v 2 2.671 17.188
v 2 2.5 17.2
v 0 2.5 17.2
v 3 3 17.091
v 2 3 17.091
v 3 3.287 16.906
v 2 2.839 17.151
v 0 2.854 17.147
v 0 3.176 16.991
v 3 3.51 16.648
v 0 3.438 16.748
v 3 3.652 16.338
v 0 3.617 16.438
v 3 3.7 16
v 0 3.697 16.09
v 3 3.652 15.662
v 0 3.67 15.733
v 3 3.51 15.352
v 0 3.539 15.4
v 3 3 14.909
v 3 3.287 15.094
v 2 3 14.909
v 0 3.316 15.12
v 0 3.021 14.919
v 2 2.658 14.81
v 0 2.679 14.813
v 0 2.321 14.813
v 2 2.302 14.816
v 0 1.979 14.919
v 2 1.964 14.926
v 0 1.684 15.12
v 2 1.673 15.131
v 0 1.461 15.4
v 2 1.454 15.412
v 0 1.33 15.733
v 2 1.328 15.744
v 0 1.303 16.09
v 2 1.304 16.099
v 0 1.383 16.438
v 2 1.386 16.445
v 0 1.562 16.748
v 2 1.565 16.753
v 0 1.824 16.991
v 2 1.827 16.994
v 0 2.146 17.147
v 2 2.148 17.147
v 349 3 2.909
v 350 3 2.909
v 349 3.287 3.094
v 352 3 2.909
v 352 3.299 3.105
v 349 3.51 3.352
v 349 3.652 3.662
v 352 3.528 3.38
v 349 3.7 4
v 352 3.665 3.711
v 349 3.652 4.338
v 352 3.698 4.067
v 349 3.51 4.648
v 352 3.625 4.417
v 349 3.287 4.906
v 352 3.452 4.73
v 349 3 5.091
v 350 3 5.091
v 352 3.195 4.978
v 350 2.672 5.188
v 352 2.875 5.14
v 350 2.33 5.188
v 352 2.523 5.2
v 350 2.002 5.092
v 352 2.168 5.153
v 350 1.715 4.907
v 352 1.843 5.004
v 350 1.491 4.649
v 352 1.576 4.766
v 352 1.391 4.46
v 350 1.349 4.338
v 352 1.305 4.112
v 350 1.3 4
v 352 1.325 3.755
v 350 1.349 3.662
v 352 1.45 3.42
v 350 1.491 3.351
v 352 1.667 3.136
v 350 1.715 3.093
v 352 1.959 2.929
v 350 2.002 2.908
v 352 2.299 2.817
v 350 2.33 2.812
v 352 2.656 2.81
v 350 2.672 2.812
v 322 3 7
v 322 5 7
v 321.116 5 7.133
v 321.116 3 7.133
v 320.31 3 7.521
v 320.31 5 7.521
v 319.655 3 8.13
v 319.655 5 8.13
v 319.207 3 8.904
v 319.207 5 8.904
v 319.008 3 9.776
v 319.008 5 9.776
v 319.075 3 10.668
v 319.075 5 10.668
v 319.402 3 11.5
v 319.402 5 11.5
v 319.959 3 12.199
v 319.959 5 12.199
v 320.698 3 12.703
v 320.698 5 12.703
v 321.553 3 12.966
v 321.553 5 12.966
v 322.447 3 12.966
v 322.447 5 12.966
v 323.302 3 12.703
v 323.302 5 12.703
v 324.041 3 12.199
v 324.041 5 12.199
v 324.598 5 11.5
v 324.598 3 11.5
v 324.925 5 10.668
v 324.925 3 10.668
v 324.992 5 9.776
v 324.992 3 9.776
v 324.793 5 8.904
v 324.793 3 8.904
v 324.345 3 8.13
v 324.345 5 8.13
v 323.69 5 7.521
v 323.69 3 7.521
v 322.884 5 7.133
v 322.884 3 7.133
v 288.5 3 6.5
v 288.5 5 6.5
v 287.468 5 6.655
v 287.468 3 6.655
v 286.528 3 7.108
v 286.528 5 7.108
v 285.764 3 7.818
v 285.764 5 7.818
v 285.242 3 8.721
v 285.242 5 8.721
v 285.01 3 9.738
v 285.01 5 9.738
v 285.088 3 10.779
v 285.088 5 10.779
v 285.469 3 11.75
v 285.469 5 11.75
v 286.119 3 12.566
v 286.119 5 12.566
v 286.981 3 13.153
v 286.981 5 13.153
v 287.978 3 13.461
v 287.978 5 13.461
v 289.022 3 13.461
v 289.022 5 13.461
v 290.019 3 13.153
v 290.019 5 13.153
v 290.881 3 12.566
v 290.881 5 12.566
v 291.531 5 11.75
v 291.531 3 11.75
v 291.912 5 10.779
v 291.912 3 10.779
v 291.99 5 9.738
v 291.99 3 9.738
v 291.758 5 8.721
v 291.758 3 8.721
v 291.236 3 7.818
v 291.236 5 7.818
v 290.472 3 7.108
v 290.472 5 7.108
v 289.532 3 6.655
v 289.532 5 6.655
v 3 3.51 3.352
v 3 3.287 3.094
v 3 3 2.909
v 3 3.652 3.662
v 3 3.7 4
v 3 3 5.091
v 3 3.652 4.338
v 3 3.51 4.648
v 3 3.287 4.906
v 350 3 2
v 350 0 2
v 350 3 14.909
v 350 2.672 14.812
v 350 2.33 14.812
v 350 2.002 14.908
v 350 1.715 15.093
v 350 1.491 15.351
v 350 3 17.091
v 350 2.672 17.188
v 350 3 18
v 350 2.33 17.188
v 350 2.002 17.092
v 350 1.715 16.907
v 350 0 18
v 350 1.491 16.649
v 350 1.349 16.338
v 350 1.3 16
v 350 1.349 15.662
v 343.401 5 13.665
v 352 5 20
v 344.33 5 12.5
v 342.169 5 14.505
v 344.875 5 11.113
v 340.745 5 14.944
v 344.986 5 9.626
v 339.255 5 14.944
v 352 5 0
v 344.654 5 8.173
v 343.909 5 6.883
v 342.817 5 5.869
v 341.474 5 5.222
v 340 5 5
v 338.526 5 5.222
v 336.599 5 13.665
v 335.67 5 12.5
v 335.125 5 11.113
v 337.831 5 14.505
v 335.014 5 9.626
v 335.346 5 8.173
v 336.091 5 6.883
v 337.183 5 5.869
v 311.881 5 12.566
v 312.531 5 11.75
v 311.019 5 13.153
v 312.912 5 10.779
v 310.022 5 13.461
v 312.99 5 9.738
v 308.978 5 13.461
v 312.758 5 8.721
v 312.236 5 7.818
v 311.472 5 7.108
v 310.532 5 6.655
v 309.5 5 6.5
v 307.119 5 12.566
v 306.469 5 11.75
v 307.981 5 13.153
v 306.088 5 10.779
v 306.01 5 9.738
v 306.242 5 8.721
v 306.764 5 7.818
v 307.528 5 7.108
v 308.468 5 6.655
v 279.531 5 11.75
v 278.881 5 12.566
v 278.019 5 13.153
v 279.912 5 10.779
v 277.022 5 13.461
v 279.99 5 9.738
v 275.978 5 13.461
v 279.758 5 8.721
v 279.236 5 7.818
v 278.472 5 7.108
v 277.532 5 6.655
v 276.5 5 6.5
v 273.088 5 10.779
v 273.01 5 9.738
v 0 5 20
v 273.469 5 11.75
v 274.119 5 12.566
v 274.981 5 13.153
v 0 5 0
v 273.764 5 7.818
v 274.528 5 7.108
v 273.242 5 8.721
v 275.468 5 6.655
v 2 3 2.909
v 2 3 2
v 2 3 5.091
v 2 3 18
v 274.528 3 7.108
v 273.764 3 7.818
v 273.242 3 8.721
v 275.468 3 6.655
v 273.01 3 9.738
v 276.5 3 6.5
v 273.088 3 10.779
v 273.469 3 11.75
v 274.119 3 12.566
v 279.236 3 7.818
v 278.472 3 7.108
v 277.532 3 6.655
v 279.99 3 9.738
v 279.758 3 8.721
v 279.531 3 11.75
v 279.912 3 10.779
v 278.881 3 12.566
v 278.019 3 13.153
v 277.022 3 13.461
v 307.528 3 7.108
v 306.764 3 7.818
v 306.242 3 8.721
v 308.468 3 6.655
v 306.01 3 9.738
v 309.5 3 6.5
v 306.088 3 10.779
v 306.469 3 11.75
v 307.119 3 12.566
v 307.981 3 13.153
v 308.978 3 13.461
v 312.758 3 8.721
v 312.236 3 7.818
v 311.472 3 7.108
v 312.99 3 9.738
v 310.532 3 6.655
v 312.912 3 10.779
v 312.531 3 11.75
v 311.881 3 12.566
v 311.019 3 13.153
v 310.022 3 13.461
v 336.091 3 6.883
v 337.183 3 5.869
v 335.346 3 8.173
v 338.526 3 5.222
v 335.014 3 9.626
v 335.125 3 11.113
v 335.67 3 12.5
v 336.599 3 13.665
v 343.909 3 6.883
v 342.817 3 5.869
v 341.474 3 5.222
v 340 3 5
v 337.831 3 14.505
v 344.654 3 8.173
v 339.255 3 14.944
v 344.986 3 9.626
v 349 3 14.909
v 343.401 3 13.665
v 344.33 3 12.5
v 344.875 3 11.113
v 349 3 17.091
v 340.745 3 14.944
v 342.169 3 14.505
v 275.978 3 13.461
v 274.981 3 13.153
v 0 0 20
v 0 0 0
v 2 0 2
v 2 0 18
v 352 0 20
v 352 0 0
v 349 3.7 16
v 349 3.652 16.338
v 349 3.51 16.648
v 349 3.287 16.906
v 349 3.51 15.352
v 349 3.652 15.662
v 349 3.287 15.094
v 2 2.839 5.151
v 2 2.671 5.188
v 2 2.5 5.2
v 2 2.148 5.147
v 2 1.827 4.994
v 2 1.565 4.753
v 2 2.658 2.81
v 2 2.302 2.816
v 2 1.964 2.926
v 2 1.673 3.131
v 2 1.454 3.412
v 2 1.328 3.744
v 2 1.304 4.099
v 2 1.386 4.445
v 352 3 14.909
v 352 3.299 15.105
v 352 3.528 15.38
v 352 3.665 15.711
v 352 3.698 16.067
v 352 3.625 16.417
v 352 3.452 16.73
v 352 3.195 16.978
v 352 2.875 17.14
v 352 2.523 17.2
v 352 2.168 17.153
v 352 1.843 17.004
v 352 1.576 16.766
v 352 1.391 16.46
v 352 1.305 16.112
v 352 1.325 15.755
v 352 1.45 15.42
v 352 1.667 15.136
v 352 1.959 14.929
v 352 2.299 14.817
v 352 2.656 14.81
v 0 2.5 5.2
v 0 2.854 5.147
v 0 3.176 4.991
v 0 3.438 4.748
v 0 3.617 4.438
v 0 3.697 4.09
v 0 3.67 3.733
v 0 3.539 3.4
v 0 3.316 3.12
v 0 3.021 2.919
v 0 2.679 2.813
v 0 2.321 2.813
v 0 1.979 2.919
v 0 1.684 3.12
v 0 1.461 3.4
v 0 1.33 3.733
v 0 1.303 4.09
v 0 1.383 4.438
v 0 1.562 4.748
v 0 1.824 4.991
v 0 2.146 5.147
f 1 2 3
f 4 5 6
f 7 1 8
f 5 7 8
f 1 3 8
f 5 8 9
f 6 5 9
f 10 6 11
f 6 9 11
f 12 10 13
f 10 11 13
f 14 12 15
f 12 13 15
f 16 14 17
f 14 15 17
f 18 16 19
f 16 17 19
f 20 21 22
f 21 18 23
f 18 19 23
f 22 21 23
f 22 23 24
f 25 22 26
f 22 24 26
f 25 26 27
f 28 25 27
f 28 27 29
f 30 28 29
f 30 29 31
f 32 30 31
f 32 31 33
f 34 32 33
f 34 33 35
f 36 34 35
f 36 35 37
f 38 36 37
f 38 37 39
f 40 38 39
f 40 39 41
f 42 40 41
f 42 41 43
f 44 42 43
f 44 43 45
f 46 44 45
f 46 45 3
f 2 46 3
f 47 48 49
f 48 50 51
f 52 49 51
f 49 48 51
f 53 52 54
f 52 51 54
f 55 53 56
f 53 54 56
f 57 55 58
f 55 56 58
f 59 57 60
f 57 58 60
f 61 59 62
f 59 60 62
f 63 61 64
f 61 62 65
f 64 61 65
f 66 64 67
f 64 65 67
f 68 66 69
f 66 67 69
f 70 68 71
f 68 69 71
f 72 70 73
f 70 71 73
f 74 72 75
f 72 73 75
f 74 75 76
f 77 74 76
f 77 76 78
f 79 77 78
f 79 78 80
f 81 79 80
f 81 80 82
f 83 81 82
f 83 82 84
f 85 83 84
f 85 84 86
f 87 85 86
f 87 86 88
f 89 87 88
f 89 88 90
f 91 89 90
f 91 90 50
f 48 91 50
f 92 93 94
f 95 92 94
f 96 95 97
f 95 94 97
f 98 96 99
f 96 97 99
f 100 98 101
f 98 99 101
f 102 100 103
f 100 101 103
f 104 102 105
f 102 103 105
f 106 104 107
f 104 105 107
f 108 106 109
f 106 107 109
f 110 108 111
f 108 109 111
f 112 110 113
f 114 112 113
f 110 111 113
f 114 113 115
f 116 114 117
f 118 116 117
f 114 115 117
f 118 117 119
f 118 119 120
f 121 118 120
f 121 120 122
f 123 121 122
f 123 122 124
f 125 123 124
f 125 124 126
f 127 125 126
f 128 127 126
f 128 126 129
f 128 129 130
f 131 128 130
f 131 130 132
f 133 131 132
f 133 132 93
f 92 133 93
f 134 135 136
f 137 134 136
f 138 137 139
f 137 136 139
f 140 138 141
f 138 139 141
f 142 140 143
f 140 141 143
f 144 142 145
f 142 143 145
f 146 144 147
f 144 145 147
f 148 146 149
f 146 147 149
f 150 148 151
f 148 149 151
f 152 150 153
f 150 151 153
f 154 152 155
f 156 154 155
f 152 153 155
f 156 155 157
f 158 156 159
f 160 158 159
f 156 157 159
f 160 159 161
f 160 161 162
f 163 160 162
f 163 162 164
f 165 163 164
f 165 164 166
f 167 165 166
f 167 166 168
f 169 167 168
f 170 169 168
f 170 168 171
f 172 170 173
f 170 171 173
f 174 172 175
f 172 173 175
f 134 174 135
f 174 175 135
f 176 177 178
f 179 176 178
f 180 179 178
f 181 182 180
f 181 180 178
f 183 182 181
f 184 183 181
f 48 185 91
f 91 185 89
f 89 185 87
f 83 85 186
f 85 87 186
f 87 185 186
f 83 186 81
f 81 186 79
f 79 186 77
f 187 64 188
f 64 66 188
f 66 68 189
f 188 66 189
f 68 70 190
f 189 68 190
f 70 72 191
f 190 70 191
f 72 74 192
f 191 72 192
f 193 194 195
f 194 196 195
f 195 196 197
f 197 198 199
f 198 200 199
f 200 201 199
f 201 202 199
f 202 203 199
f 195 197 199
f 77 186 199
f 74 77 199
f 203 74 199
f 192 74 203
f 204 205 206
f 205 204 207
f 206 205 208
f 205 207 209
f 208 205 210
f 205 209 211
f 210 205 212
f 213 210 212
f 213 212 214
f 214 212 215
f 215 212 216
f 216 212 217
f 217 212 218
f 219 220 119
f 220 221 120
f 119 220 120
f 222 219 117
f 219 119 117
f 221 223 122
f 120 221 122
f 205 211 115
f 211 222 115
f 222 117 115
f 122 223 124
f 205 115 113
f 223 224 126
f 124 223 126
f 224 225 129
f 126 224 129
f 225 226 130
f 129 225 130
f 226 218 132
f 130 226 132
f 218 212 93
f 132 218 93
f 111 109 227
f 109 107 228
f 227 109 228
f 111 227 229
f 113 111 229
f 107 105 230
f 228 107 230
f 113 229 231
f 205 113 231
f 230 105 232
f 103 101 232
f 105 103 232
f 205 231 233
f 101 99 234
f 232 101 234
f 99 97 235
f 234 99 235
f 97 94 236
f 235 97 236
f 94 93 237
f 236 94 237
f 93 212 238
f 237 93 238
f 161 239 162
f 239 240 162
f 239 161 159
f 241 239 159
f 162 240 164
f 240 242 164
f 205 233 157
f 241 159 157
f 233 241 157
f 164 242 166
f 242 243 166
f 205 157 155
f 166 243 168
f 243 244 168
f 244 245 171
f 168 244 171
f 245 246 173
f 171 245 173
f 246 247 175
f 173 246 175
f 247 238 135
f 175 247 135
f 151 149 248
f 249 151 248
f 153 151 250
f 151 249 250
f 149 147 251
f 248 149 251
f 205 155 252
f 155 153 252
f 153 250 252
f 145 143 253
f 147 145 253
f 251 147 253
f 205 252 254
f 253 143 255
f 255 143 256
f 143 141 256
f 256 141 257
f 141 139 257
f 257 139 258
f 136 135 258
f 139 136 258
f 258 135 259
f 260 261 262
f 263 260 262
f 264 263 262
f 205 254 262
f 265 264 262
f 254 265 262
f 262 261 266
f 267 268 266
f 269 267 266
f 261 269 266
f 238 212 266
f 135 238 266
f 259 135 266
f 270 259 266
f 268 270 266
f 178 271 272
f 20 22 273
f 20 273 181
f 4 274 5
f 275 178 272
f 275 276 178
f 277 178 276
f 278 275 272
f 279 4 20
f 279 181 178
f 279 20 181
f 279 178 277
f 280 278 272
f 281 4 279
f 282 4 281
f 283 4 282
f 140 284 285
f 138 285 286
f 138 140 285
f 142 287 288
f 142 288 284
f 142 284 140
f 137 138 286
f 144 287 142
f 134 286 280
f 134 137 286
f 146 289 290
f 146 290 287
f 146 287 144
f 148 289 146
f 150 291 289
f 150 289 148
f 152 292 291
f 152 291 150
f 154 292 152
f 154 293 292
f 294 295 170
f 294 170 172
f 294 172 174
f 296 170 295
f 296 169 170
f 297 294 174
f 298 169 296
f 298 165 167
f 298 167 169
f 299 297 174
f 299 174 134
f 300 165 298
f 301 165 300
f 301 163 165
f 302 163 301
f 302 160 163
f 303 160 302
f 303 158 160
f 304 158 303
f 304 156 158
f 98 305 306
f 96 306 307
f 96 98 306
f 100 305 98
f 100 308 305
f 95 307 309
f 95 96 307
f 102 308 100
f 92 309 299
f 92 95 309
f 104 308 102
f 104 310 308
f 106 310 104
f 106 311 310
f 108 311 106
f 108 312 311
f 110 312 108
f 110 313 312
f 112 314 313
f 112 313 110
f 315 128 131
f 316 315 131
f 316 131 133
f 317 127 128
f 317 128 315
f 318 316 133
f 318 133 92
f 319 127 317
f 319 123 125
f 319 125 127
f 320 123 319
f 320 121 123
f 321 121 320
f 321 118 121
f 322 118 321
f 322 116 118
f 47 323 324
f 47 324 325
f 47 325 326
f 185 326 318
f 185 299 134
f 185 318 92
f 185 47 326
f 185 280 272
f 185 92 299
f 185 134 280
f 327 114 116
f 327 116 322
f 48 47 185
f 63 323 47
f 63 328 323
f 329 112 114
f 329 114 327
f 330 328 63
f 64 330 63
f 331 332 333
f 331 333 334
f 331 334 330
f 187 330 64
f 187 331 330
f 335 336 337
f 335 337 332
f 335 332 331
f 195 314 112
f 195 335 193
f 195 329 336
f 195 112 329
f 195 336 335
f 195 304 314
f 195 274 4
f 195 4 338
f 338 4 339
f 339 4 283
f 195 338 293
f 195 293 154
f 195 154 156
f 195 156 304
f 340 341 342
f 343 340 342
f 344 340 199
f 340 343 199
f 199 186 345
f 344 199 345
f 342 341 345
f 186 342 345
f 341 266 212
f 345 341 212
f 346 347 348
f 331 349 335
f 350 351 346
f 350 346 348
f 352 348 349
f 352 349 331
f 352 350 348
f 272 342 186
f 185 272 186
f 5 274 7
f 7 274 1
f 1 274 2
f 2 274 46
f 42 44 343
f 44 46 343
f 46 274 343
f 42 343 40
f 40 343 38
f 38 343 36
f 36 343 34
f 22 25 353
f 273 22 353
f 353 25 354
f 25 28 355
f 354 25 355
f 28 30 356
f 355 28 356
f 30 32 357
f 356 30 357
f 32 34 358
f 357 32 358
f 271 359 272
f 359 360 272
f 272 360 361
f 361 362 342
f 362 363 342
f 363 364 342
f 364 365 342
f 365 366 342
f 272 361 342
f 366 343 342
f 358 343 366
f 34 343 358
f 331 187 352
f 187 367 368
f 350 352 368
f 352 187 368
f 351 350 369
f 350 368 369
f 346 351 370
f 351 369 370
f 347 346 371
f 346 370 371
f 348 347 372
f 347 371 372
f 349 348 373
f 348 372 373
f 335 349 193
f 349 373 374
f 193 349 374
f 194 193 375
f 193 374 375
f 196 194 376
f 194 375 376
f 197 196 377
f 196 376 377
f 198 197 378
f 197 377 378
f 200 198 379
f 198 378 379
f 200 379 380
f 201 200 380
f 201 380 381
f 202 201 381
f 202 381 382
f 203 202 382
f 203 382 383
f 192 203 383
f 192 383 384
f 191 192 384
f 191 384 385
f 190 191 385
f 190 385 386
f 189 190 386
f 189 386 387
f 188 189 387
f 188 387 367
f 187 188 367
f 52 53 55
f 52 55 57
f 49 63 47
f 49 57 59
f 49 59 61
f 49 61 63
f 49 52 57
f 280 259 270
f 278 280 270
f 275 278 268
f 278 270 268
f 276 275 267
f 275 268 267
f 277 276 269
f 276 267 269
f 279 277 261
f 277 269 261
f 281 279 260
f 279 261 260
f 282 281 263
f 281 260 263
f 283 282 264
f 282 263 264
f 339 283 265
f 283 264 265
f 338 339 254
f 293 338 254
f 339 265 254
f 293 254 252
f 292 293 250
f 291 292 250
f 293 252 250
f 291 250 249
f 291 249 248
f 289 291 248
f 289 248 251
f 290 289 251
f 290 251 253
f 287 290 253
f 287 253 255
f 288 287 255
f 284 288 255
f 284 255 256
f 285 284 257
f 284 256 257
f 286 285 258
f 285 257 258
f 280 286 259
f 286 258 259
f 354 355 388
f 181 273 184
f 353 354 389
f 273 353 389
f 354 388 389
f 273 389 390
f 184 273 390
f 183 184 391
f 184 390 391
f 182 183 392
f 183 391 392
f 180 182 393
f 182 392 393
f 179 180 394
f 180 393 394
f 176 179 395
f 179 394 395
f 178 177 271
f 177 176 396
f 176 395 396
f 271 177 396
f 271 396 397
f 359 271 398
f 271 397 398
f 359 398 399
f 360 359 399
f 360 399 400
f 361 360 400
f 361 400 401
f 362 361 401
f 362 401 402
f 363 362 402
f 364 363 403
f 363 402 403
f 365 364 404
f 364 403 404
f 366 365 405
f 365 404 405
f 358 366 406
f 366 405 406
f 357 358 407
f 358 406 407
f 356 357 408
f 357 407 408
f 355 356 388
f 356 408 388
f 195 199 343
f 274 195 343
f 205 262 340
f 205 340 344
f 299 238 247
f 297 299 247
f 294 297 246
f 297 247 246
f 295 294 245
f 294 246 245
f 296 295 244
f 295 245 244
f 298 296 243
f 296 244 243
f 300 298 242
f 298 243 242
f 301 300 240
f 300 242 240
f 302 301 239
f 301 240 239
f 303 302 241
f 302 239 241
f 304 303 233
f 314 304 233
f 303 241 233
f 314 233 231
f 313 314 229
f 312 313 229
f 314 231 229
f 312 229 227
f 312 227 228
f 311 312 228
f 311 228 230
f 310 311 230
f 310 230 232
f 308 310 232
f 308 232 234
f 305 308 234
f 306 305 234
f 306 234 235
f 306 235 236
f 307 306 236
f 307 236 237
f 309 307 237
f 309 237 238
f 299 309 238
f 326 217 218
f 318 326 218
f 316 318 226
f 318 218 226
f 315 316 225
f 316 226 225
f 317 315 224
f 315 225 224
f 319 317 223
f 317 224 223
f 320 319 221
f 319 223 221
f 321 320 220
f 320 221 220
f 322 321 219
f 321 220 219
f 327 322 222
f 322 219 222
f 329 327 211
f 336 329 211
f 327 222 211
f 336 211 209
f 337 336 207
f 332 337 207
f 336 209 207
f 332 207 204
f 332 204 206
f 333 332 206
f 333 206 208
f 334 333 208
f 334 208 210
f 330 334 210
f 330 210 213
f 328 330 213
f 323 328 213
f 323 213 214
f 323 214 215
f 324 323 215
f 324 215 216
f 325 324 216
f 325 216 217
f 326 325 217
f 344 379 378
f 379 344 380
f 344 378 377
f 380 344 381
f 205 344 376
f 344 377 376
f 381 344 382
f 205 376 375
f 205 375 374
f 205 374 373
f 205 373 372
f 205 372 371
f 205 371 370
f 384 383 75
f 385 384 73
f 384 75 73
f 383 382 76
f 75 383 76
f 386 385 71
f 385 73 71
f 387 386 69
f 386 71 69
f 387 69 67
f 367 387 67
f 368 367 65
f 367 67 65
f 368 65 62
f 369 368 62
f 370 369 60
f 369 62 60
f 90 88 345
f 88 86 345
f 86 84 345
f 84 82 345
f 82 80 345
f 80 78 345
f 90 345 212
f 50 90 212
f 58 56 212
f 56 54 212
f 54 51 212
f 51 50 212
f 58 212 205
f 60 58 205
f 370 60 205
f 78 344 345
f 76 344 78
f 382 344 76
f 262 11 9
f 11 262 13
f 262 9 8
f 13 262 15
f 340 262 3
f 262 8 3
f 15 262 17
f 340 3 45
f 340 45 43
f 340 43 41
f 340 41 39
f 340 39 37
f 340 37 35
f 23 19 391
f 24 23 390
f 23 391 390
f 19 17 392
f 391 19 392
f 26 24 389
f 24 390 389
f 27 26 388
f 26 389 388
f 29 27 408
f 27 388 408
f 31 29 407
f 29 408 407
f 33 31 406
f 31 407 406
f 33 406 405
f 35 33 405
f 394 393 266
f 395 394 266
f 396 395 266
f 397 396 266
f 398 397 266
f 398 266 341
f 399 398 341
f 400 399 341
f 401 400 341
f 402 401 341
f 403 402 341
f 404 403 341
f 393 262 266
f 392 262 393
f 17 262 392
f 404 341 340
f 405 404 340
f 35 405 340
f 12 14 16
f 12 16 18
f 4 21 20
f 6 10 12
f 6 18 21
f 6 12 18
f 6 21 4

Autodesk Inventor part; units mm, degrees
ref_plane "YZ Plane" through (0, 0, 0) normal (1, 0, 0) x (0, 1, 0)
ref_plane "XZ Plane" through (0, 0, 0) normal (0, 1, 0) x (-1, 0, 0)
ref_plane "XY Plane" through (0, 0, 0) normal (0, 0, 1) x (1, 0, 0)
sketch "スケッチ1" plane through (0, 0, 0) normal (0, 0, 1) x (1, 0, 0)
  line L0 (0, 0) -> (352, 0)
  line L1 (352, 0) -> (352, 5)
  line L2 (352, 5) -> (0, 5)
  line L3 (0, 5) -> (0, 0)
  line L4 (0, 0) -> (6, 0)
  line L5 (0, 1) -> (0, 0)
  dimension "d0" = 352
  dimension "d1" = 5
extrude "押し出し1" add sketch "スケッチ1" along normal blind 20
sketch "スケッチ3" plane through (0, 0, 0) normal (-1, 0, 0) x (0, 0, 1)
  line L0 (0, 5) -> (0, 0) projected
  line L1 (0, 0) -> (20, 0) projected
  line L2 (20, 5) -> (20, 0) projected
  line L3 (0, 5) -> (20, 5) projected
  circle A0 centre (4, 2.5) radius 1.2
  circle A1 centre (16, 2.5) radius 1.2
  dimension "d14" = 2.4
  dimension "d15" = 2.4
  dimension "d16" = 2.5
  dimension "d17" = 4
  dimension "d18" = 4
  dimension "d19" = 2.5
extrude "押し出し3" cut sketch "スケッチ3" against normal blind 3 contours A0 | A1
sketch "スケッチ4" plane through (0, 0, 0) normal (0, -1, 0) x (1, 0, 0)
  line L0 (0, 0) -> (352, 0) projected
  line L1 (352, 0) -> (352, 20) projected
  line L2 (0, 20) -> (352, 20) projected
  line L3 (0, 0) -> (0, 20) projected
  line L4 (2, 2) -> (350, 2)
  line L5 (350, 2) -> (350, 18)
  line L6 (350, 18) -> (2, 18)
  line L7 (2, 18) -> (2, 2)
  dimension "d22" = 2
  dimension "d23" = 2
  dimension "d24" = 2
  dimension "d25" = 2
extrude "押し出し4" cut sketch "スケッチ4" against normal blind 3 contours L7 L6 L5 L4
sketch "スケッチ6" plane through (0, 3, 0) normal (0, -1, 0) x (1, 0, 0)
  line L0 (350, 18) -> (350, 2) projected
  line L1 (2, 18) -> (350, 18) projected
  point P0 (0, 0)
  point P1 (340, 10)
  dimension "d35" = 10
  dimension "d36" = 8
  dimension "d37" = 16
hole "穴1" at (340, 3, 10) direction (0, 1, 0) diameter 10 end through all
sketch "スケッチ7" plane through (0, 3, 0) normal (0, -1, 0) x (1, 0, 0)
  circle A0 centre (340, 10) radius 5 projected
  line L0 (340, 10) -> (322, 10)
  point P0 (0, 0)
  dimension "d38" = 18
hole "穴2" at (322, 3, 10) direction (0, 1, 0) diameter 6 end through all
sketch "スケッチ8" plane through (0, 3, 0) normal (0, -1, 0) x (1, 0, 0)
  circle A0 centre (322, 10) radius 3 projected
  line L0 (322, 10) -> (309.5, 10)
  point P0 (0, 0)
  dimension "d46" = 12.5
hole "穴3" at (309.5, 3, 10) direction (0, 1, 0) diameter 7 end through all
sketch "スケッチ9" plane through (0, 3, 0) normal (0, -1, 0) x (1, 0, 0)
  circle A0 centre (309.5, 10) radius 3.5 projected
  line L0 (309.5, 10) -> (288.5, 10)
  point P0 (0, 0)
  dimension "d54" = 21
hole "穴4" at (288.5, 3, 10) direction (0, 1, 0) diameter 7 end through all
sketch "スケッチ10" plane through (0, 3, 0) normal (0, -1, 0) x (1, 0, 0)
  circle A0 centre (288.5, 10) radius 3.5 projected
  line L0 (288.5, 10) -> (276.5, 10)
  point P0 (0, 0)
  dimension "d62" = 12
hole "穴5" at (276.5, 3, 10) direction (0, 1, 0) diameter 7 end through all
sketch "スケッチ11" plane through (352, 0, 0) normal (1, 0, 0) x (0, 0, -1)
  arc A0 (-5.0909, 3) -> (-2.9091, 3) centre (-4, 2.5) ccw projected
  arc A1 (-17.0909, 3) -> (-14.9091, 3) centre (-16, 2.5) ccw projected
  arc A2 (-14.9091, 3) -> (-17.0909, 3) centre (-16, 2.5) ccw projected
  arc A3 (-2.9091, 3) -> (-5.0909, 3) centre (-4, 2.5) ccw projected
extrude "押し出し5" cut sketch "スケッチ11" against normal blind 3
equation "\"d36\" = 0.5 * d37"
properties part number "arm1_L" material "アルミニウム 6061"
